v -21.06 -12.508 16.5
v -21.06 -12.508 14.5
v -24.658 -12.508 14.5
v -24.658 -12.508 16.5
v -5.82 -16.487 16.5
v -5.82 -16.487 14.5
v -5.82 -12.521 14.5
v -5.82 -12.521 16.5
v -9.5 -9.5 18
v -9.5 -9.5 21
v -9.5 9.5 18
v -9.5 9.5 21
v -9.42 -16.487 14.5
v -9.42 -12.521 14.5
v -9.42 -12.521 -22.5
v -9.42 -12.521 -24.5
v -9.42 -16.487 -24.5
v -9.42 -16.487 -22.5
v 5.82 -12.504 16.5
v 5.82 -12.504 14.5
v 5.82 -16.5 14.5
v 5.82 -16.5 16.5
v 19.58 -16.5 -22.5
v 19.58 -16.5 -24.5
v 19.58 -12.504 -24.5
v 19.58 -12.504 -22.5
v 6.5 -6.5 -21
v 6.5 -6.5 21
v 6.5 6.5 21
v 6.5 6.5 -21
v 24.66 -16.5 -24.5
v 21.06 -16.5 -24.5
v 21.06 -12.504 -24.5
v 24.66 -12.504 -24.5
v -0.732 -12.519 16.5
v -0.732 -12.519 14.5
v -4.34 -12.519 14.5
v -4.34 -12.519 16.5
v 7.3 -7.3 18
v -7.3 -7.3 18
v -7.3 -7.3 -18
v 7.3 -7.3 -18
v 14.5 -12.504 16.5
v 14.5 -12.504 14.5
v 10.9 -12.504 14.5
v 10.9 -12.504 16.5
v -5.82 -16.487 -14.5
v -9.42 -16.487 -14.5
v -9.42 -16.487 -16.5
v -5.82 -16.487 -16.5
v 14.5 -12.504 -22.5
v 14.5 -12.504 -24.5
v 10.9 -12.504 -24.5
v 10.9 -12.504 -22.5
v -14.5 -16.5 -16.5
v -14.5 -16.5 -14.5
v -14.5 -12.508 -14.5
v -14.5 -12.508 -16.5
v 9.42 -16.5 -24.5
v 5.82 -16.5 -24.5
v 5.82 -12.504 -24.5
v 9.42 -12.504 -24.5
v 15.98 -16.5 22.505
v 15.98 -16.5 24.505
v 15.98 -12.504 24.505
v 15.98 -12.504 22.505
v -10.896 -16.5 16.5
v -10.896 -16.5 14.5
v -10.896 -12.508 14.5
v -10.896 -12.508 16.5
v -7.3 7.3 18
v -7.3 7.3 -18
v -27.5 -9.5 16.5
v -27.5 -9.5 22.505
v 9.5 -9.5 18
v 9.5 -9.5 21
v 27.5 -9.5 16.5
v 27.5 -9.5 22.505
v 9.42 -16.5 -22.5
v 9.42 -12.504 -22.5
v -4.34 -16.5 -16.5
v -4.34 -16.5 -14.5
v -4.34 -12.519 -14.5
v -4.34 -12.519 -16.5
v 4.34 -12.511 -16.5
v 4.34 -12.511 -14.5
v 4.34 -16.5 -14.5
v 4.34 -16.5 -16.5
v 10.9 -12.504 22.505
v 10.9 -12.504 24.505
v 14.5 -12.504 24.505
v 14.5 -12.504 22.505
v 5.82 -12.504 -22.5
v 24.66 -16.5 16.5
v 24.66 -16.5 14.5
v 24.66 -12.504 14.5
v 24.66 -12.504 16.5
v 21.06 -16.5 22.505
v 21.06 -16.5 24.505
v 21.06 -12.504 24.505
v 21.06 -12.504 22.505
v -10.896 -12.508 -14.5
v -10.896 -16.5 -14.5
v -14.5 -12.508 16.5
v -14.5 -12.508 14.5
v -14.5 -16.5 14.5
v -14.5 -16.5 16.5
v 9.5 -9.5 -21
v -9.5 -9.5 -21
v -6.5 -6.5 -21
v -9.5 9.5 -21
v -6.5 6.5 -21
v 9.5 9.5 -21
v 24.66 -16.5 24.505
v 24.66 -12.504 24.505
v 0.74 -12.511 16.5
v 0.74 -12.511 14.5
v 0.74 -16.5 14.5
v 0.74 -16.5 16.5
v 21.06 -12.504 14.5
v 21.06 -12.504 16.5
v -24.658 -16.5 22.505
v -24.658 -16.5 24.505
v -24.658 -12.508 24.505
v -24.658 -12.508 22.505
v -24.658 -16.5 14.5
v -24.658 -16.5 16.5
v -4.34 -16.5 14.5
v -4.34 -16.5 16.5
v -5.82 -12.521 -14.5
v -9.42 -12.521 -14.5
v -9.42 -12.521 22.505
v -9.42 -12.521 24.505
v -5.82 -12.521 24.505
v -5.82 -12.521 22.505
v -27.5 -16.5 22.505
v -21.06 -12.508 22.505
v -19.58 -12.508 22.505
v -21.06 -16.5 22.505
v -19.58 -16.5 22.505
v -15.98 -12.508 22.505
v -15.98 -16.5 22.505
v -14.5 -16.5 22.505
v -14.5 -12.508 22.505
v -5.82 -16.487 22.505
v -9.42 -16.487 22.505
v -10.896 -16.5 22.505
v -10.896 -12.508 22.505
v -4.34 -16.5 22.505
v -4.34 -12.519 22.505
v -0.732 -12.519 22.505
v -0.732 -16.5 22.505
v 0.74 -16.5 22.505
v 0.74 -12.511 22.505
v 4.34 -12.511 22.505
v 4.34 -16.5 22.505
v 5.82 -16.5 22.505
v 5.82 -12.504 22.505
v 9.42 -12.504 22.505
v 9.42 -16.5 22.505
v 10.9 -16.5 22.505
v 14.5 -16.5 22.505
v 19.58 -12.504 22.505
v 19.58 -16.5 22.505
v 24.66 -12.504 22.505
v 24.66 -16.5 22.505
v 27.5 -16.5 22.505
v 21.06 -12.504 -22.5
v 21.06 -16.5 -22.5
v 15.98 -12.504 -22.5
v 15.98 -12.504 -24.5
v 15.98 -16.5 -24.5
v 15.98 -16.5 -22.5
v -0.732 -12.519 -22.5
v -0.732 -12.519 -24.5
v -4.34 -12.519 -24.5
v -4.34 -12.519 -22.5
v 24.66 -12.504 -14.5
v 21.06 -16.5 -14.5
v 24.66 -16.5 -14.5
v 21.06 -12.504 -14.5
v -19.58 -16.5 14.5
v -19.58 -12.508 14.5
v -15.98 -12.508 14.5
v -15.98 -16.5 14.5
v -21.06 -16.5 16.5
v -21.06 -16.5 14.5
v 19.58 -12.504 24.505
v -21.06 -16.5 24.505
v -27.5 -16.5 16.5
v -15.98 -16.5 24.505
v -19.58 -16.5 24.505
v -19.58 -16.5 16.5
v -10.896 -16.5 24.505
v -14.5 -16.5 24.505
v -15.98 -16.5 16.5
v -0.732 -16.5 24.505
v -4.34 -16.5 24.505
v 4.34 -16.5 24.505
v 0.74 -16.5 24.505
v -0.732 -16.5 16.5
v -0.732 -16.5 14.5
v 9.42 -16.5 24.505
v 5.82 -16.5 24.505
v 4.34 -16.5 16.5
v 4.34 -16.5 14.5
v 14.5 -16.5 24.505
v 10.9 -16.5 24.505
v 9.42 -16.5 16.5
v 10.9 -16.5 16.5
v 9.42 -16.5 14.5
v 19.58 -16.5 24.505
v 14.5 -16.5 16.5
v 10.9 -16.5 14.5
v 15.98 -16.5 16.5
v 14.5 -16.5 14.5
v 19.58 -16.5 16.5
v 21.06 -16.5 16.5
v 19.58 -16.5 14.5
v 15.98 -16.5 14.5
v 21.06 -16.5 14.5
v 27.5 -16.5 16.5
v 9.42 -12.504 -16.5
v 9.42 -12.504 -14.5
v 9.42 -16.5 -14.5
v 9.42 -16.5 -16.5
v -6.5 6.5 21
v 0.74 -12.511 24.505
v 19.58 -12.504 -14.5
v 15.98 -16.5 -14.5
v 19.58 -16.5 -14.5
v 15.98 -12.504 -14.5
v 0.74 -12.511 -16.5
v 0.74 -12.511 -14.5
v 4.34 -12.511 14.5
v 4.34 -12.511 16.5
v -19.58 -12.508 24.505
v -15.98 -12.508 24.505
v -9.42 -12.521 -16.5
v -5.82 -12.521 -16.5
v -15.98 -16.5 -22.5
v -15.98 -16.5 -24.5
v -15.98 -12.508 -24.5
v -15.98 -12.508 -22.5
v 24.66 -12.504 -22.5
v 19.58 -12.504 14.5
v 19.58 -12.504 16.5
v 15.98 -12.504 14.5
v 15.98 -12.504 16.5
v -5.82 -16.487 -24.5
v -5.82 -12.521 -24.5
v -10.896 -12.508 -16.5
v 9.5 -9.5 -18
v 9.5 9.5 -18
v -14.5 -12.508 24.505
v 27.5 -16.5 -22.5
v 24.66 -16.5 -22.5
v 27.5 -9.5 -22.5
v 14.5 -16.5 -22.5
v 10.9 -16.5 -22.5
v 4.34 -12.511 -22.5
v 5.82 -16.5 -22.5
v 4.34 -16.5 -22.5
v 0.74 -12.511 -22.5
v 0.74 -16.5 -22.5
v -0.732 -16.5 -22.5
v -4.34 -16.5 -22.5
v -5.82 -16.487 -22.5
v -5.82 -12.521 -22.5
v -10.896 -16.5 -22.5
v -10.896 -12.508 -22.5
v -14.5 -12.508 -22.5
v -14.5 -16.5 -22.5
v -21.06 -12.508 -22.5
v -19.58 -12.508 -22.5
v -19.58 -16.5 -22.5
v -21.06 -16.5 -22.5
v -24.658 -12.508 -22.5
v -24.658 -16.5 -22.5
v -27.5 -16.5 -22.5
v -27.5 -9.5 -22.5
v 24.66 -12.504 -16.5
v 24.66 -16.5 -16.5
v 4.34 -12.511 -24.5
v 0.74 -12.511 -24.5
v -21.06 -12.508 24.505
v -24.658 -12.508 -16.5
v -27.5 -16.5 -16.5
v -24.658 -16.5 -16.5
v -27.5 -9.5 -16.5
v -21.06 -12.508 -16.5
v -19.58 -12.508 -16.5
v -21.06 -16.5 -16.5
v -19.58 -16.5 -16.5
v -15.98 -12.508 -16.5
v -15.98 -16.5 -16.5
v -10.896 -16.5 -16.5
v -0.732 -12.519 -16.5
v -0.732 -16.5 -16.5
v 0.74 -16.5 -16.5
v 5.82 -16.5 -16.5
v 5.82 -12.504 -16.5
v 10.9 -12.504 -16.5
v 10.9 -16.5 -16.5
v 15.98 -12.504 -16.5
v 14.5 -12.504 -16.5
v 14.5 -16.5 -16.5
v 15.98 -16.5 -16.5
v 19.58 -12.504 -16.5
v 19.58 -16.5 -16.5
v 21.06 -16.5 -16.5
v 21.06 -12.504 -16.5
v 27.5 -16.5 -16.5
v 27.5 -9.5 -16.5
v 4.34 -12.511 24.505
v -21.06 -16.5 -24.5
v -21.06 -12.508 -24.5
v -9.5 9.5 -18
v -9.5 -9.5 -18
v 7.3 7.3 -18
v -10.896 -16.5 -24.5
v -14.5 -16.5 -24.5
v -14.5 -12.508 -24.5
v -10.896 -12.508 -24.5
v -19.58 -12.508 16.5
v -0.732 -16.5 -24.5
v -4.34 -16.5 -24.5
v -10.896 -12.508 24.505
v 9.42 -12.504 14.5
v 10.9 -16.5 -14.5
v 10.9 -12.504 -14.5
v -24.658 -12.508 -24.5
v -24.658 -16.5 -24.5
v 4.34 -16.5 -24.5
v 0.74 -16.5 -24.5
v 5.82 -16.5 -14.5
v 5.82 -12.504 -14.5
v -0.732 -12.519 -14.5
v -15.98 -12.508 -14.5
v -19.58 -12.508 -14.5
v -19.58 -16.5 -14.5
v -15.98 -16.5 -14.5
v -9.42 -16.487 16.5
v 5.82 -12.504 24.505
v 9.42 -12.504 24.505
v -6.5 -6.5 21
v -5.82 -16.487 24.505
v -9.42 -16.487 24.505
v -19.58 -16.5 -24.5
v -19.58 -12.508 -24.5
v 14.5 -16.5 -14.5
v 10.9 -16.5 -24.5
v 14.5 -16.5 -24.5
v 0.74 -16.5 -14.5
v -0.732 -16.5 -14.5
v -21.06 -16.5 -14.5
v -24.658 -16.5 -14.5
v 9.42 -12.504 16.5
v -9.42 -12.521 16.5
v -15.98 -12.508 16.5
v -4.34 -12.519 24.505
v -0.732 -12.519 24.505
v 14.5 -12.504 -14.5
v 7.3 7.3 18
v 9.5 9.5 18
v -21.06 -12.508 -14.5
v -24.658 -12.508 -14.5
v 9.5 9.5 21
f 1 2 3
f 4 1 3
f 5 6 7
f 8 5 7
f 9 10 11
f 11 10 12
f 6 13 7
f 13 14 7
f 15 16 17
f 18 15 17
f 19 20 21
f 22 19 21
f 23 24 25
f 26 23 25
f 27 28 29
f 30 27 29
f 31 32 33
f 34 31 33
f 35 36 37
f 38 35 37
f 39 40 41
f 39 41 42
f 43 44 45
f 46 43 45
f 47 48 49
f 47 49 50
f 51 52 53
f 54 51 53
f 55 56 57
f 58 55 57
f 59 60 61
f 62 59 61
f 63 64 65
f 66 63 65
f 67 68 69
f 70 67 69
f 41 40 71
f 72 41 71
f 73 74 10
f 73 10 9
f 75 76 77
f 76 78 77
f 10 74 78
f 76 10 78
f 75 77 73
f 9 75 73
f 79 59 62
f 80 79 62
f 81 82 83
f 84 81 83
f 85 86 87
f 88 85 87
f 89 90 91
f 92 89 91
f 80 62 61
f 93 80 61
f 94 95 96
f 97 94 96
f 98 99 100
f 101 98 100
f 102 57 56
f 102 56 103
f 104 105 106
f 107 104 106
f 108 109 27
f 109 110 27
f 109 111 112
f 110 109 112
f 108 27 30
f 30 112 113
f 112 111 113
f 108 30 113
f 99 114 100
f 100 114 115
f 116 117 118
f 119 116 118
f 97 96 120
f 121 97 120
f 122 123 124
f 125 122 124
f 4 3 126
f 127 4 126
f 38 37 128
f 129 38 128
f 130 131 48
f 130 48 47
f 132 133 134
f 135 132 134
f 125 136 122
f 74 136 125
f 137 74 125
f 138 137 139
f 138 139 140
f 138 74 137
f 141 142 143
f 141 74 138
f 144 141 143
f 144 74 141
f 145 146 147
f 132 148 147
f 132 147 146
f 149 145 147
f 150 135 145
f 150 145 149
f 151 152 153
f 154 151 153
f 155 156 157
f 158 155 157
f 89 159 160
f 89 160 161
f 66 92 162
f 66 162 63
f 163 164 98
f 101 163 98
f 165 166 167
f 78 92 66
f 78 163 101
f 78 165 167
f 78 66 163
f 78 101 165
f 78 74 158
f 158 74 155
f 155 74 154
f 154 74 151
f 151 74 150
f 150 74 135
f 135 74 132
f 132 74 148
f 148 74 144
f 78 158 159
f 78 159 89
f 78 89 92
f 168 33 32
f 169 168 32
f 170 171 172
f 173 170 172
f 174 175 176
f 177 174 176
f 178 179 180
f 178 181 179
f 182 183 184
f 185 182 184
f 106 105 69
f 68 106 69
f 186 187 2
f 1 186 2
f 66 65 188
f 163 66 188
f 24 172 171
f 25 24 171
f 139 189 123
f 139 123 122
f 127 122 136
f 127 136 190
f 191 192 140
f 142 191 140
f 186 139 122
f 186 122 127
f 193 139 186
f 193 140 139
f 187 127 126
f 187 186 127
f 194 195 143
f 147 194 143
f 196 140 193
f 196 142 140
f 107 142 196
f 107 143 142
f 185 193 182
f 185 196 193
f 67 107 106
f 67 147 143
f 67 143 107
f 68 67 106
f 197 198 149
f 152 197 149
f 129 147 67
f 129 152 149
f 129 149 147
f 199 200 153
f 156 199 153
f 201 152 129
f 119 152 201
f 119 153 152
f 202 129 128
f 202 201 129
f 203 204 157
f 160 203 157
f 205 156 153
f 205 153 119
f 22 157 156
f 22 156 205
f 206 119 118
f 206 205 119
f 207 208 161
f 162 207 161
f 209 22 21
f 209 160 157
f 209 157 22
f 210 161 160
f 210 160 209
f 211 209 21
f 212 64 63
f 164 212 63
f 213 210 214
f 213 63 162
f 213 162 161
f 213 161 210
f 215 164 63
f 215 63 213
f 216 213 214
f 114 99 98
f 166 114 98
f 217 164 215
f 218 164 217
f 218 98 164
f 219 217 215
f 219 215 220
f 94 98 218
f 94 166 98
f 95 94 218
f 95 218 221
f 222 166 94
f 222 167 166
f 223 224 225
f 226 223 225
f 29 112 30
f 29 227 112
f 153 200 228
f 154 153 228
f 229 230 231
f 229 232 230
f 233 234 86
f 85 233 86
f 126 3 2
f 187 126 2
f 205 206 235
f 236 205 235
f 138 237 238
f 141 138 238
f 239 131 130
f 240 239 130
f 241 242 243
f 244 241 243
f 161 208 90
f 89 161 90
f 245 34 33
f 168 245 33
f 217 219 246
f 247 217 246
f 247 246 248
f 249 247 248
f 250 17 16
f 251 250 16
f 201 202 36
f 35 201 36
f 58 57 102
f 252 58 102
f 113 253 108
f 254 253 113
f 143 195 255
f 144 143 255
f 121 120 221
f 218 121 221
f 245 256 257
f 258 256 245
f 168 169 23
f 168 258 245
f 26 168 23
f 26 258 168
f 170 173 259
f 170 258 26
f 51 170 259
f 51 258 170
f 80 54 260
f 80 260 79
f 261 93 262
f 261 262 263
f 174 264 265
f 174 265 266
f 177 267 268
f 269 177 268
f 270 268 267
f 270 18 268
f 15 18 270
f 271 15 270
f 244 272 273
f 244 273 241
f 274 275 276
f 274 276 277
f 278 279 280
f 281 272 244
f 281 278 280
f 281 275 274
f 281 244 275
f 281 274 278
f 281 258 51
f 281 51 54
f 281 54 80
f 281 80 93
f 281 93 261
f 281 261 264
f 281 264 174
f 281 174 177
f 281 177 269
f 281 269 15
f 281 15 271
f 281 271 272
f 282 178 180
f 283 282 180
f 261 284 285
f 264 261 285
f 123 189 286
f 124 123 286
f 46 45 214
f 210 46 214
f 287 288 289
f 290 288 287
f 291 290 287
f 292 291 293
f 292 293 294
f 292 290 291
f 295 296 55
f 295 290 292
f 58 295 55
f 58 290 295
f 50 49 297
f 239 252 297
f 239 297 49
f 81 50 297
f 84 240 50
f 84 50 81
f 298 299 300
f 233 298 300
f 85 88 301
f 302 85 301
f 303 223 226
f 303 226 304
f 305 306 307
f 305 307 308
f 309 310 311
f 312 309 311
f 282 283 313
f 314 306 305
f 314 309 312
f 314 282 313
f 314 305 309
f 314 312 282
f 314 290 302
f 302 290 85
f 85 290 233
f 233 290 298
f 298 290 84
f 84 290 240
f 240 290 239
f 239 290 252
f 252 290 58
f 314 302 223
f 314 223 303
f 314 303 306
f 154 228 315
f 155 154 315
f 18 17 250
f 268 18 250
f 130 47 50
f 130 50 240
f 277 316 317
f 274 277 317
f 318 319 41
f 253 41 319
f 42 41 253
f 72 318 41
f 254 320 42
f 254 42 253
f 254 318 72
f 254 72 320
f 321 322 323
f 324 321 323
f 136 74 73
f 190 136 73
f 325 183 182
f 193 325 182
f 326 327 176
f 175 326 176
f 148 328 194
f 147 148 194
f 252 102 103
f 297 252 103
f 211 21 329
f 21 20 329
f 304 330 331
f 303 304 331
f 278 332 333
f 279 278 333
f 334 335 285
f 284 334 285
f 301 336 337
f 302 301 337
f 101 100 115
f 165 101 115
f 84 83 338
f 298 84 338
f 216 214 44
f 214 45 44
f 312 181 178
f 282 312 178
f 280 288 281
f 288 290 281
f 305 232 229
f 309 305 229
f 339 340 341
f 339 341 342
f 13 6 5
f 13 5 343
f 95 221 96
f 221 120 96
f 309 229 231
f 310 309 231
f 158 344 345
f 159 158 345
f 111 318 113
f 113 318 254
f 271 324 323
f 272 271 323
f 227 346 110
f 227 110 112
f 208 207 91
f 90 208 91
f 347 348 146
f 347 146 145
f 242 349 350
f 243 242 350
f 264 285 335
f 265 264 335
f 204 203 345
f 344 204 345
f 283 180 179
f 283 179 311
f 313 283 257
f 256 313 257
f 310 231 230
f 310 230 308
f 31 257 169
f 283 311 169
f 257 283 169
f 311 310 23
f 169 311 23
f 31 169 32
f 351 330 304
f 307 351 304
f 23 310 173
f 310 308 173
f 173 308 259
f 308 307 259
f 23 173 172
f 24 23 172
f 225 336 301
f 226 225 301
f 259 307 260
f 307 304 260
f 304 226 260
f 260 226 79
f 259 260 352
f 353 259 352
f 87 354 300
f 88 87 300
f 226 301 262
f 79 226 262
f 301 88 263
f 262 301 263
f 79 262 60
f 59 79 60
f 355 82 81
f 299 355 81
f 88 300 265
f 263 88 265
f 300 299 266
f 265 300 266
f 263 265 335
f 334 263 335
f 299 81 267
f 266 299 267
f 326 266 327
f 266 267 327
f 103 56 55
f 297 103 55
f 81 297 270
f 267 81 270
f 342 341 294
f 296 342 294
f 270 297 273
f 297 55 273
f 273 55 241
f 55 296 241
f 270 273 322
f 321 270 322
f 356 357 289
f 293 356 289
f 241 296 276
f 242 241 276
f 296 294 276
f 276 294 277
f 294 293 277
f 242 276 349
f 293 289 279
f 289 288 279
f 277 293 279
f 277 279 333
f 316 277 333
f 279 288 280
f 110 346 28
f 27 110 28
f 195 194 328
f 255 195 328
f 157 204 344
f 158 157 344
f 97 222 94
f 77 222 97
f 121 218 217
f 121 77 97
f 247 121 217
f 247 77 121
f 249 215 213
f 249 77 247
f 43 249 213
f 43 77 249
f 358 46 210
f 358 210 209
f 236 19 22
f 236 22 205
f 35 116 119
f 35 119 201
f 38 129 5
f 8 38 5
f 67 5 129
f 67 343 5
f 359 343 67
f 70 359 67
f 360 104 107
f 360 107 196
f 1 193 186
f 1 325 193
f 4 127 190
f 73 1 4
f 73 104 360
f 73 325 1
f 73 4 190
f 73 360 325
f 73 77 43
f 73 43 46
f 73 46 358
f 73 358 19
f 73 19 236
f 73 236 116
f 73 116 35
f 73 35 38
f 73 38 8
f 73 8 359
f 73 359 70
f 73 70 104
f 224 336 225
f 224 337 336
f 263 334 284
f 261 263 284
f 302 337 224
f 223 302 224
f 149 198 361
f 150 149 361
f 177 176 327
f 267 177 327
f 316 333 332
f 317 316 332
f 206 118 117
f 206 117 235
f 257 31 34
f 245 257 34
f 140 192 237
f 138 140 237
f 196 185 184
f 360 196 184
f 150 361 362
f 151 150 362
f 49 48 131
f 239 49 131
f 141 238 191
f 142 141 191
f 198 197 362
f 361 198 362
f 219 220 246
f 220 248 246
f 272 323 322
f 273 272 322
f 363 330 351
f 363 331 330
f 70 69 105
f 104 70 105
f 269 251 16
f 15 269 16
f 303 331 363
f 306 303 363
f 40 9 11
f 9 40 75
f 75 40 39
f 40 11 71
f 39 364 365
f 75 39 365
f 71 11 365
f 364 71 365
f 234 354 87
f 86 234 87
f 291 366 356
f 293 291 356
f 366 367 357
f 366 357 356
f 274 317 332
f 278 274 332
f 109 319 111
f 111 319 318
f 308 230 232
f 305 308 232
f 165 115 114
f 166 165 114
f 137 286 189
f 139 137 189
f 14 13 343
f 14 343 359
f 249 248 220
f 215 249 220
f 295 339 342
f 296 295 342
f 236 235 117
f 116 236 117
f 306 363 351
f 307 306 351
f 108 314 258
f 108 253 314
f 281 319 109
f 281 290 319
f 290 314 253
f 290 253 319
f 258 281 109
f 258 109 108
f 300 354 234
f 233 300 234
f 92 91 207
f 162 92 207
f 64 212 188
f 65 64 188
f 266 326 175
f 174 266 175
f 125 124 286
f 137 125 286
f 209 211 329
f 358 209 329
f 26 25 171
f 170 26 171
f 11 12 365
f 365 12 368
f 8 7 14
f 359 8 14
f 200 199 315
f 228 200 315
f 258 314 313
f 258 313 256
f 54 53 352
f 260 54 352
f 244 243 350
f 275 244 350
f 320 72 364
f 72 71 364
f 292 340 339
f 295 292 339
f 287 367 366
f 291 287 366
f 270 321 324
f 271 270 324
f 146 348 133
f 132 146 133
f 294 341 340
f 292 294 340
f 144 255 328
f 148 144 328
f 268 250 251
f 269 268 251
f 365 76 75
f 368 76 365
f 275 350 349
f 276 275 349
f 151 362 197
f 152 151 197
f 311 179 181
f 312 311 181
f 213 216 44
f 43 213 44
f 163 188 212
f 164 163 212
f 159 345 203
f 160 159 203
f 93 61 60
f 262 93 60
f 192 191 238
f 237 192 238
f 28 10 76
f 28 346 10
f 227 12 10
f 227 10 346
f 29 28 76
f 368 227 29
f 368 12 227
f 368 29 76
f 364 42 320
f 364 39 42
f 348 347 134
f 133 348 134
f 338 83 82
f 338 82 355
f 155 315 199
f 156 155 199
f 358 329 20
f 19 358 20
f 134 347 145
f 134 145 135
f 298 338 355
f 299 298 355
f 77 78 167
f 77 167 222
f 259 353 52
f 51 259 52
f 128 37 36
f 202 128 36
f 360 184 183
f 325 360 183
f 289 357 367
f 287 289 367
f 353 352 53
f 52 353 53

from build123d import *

# Parameters (mm, degrees)
EXTRUDE_1_DEPTH      = 21
SKETCH_1_3_W         = 13
SKETCH_1_3_H         = 13
CUT_EXTRUDE_1_DEPTH  = 21
SKETCH_1_12_W        = 19
SKETCH_1_12_H        = 19
SKETCH_1_12_W_2      = 14.6
SKETCH_1_12_H_2      = 14.6
SKETCH_1_12_W_3      = 13
SKETCH_1_12_H_3      = 13
CUT_EXTRUDE_6_DEPTH  = 18
CUT_EXTRUDE_7_DEPTH  = 14.5
SKETCH_4_W           = 3.504900739
SKETCH_4_H           = 7
SKETCH_4_W_2         = 3.5
EXTRUDE_2_DEPTH      = 27.5
CUT_EXTRUDE_9_DEPTH  = 2
SKETCH_7_W           = 3.6
SKETCH_7_H           = 3.966529086
CUT_EXTRUDE_10_DEPTH = 2
SKETCH_9_W           = 3.6
SKETCH_9_H           = 3.966529086
CUT_EXTRUDE_11_DEPTH = 2
SKETCH_10_W          = 3.6
SKETCH_10_H          = 3.966529086
CUT_EXTRUDE_12_DEPTH = 2


with BuildPart() as part:
    # 草图1 → 凸台-拉伸1 (new, symmetric)
    with BuildSketch(Plane.XY):
        Polygon((9.5, 9.5), (-9.5, 9.5), (-9.5, -9.5), (-27.5, -9.5), (-27.5, -16.5), (27.5, -16.5), (27.5, -9.5), (9.5, -9.5), align=None)
    extrude(amount=EXTRUDE_1_DEPTH, both=True)

    # 草图1<3> → 切除-拉伸1 (cut, symmetric)
    with BuildSketch(Plane.XY):
        Rectangle(SKETCH_1_3_W, SKETCH_1_3_H)
    extrude(amount=CUT_EXTRUDE_1_DEPTH, both=True, mode=Mode.SUBTRACT)

    # 草图1<12> → 切除-拉伸6 (cut, symmetric)
    # profile 1 of 2: a face of its own
    with BuildSketch(Plane.XY):
        Rectangle(SKETCH_1_12_W, SKETCH_1_12_H)
        Rectangle(SKETCH_1_12_W_2, SKETCH_1_12_H_2, mode=Mode.SUBTRACT)
    # profile 2 of 2: a face of its own
    with BuildSketch(Plane.XY):
        Rectangle(SKETCH_1_12_W_3, SKETCH_1_12_H_3)
    extrude(amount=CUT_EXTRUDE_6_DEPTH, both=True, mode=Mode.SUBTRACT)

    # 草图1<13> → 切除-拉伸7 (cut, symmetric)
    with BuildSketch(Plane.XY):
        Polygon((9.5, -9.5), (-9.5, -9.5), (-27.5, -9.5), (-27.5, -16.5), (27.5, -16.5), (27.5, -9.5), align=None)
    extrude(amount=CUT_EXTRUDE_7_DEPTH, both=True, mode=Mode.SUBTRACT)

    # 草图4 → 凸台-拉伸2 (add, symmetric)
    with BuildSketch(Plane(origin=(0, 0, 0), x_dir=(0, 0, -1), z_dir=(1, 0, 0))):
        with Locations((-22.752450369, -13)):
            Rectangle(SKETCH_4_W, SKETCH_4_H)
        with Locations((22.75, -13)):
            Rectangle(SKETCH_4_W_2, SKETCH_4_H)
    extrude(amount=EXTRUDE_2_DEPTH, both=True)

    # 草图5 → 切除-拉伸9 (cut)
    with BuildSketch(Plane(origin=(0, 0, -24.5), x_dir=(-1, 0, 0), z_dir=(0, 0, -1))):
        Polygon((-27.5, -9.5), (-27.5, -16.5), (-24.66, -16.5), (-24.66, -12.503647236), (-22.86, -12.503647236), (-21.06, -12.503647236), (-21.06, -16.5), (-19.58, -16.5), (-19.58, -12.503647236), (-17.78, -12.503647236), (-15.98, -12.503647236), (-15.98, -16.5), (-14.5, -16.5), (-14.5, -12.503647236), (-12.7, -12.503647236), (-10.9, -12.503647236), (-10.9, -16.5), (-9.42, -16.5), (-9.42, -12.503647236), (-7.62, -12.503647236), (-5.82, -12.503647236), (-5.82, -16.5), (-4.34, -16.5), (-4.34, -12.511103156), (-0.74, -12.511103156), (-0.74, -16.5), (0.731971317, -16.5), (0.731971317, -12.518559075), (2.535985659, -12.518559075), (4.34, -12.518559075), (4.34, -16.5), (7.62, -16.5), (10.896293739, -16.5), (10.896293739, -12.507758798), (12.698146869, -12.507758798), (14.5, -12.507758798), (14.5, -16.5), (15.980045705, -16.5), (15.980045705, -12.508203705), (17.780055728, -12.508203705), (19.580065752, -12.508203705), (19.580065752, -16.5), (21.06, -16.5), (21.06, -12.508203705), (22.859139551, -12.508203705), (24.658279102, -12.508203705), (24.658279102, -16.5), (27.5, -16.5), (27.5, -9.5), (9.5, -9.5), (-9.5, -9.5), align=None)
        Polygon((9.42, -16.487143942), (7.62, -16.487143942), (5.82, -16.487143942), (5.82, -12.520614856), (7.62, -12.520614856), (9.42, -12.520614856), align=None, mode=Mode.SUBTRACT)
    extrude(amount=-CUT_EXTRUDE_9_DEPTH, mode=Mode.SUBTRACT)

    # 草图7 → 切除-拉伸10 (cut)
    with BuildSketch(Plane(origin=(0, 0, 14.5), x_dir=(-1, 0, 0), z_dir=(0, 0, -1))):
        Polygon((19.580065752, -16.5), (21.06, -16.5), (21.06, -12.508203705), (24.658279102, -12.508203705), (24.658279102, -16.5), (27.5, -16.5), (27.5, -9.5), (-27.5, -9.5), (-27.5, -16.5), (-24.66, -16.5), (-24.66, -12.503647236), (-21.06, -12.503647236), (-21.06, -16.5), (-19.58, -16.5), (-19.58, -12.503647236), (-15.98, -12.503647236), (-15.98, -16.5), (-14.5, -16.5), (-14.5, -12.503647236), (-10.9, -12.503647236), (-10.9, -16.5), (-9.42, -16.5), (-9.42, -12.503647236), (-5.82, -12.503647236), (-5.82, -16.5), (-4.34, -16.5), (-4.34, -12.511103156), (-0.74, -12.511103156), (-0.74, -16.5), (0.731971317, -16.5), (0.731971317, -12.518559075), (4.34, -12.518559075), (4.34, -16.5), (10.896293739, -16.5), (10.896293739, -12.507758798), (14.5, -12.507758798), (14.5, -16.5), (15.980045705, -16.5), (15.980045705, -12.508203705), (19.580065752, -12.508203705), align=None)
        with Locations((7.62, -14.503879399)):
            Rectangle(SKETCH_7_W, SKETCH_7_H, mode=Mode.SUBTRACT)
    extrude(amount=-CUT_EXTRUDE_10_DEPTH, mode=Mode.SUBTRACT)

    # 草图9 → 切除-拉伸11 (cut)
    with BuildSketch(Plane.XY.offset(-14.5)):
        Polygon((24.66, -16.5), (27.5, -16.5), (27.5, -9.5), (-27.5, -9.5), (-27.5, -16.5), (-24.658279102, -16.5), (-24.658279102, -12.508203705), (-21.06, -12.508203705), (-21.06, -16.5), (-19.580065752, -16.5), (-19.580065752, -12.508203705), (-15.980045705, -12.508203705), (-15.980045705, -16.5), (-14.5, -16.5), (-14.5, -12.507758798), (-10.896293739, -12.507758798), (-10.896293739, -16.5), (-4.34, -16.5), (-4.34, -12.518559075), (-0.731971317, -12.518559075), (-0.731971317, -16.5), (0.74, -16.5), (0.74, -12.511103156), (4.34, -12.511103156), (4.34, -16.5), (5.82, -16.5), (5.82, -12.503647236), (9.42, -12.503647236), (9.42, -16.5), (10.9, -16.5), (10.9, -12.503647236), (14.5, -12.503647236), (14.5, -16.5), (15.98, -16.5), (15.98, -12.503647236), (19.58, -12.503647236), (19.58, -16.5), (21.06, -16.5), (21.06, -12.503647236), (24.66, -12.503647236), align=None)
        with Locations((-7.62, -14.503879399)):
            Rectangle(SKETCH_9_W, SKETCH_9_H, mode=Mode.SUBTRACT)
    extrude(amount=-CUT_EXTRUDE_11_DEPTH, mode=Mode.SUBTRACT)

    # 草图10 → 切除-拉伸12 (cut)
    with BuildSketch(Plane.XY.offset(24.504900739)):
        Polygon((27.5, -9.5), (-27.5, -9.5), (-27.5, -16.5), (-24.658279102, -16.5), (-24.658279102, -12.508203705), (-21.06, -12.508203705), (-21.06, -16.5), (-19.580065752, -16.5), (-19.580065752, -12.508203705), (-15.980045705, -12.508203705), (-15.980045705, -16.5), (-14.5, -16.5), (-14.5, -12.507758798), (-10.896293739, -12.507758798), (-10.896293739, -16.5), (-4.34, -16.5), (-4.34, -12.518559075), (-0.731971317, -12.518559075), (-0.731971317, -16.5), (0.74, -16.5), (0.74, -12.511103156), (4.34, -12.511103156), (4.34, -16.5), (5.82, -16.5), (5.82, -12.503647236), (9.42, -12.503647236), (9.42, -16.5), (10.9, -16.5), (10.9, -12.503647236), (14.5, -12.503647236), (14.5, -16.5), (15.98, -16.5), (15.98, -12.503647236), (19.58, -12.503647236), (19.58, -16.5), (21.06, -16.5), (21.06, -12.503647236), (24.66, -12.503647236), (24.66, -16.5), (27.5, -16.5), align=None)
        with Locations((-7.62, -14.503879399)):
            Rectangle(SKETCH_10_W, SKETCH_10_H, mode=Mode.SUBTRACT)
    extrude(amount=-CUT_EXTRUDE_12_DEPTH, mode=Mode.SUBTRACT)


solid = part.part
